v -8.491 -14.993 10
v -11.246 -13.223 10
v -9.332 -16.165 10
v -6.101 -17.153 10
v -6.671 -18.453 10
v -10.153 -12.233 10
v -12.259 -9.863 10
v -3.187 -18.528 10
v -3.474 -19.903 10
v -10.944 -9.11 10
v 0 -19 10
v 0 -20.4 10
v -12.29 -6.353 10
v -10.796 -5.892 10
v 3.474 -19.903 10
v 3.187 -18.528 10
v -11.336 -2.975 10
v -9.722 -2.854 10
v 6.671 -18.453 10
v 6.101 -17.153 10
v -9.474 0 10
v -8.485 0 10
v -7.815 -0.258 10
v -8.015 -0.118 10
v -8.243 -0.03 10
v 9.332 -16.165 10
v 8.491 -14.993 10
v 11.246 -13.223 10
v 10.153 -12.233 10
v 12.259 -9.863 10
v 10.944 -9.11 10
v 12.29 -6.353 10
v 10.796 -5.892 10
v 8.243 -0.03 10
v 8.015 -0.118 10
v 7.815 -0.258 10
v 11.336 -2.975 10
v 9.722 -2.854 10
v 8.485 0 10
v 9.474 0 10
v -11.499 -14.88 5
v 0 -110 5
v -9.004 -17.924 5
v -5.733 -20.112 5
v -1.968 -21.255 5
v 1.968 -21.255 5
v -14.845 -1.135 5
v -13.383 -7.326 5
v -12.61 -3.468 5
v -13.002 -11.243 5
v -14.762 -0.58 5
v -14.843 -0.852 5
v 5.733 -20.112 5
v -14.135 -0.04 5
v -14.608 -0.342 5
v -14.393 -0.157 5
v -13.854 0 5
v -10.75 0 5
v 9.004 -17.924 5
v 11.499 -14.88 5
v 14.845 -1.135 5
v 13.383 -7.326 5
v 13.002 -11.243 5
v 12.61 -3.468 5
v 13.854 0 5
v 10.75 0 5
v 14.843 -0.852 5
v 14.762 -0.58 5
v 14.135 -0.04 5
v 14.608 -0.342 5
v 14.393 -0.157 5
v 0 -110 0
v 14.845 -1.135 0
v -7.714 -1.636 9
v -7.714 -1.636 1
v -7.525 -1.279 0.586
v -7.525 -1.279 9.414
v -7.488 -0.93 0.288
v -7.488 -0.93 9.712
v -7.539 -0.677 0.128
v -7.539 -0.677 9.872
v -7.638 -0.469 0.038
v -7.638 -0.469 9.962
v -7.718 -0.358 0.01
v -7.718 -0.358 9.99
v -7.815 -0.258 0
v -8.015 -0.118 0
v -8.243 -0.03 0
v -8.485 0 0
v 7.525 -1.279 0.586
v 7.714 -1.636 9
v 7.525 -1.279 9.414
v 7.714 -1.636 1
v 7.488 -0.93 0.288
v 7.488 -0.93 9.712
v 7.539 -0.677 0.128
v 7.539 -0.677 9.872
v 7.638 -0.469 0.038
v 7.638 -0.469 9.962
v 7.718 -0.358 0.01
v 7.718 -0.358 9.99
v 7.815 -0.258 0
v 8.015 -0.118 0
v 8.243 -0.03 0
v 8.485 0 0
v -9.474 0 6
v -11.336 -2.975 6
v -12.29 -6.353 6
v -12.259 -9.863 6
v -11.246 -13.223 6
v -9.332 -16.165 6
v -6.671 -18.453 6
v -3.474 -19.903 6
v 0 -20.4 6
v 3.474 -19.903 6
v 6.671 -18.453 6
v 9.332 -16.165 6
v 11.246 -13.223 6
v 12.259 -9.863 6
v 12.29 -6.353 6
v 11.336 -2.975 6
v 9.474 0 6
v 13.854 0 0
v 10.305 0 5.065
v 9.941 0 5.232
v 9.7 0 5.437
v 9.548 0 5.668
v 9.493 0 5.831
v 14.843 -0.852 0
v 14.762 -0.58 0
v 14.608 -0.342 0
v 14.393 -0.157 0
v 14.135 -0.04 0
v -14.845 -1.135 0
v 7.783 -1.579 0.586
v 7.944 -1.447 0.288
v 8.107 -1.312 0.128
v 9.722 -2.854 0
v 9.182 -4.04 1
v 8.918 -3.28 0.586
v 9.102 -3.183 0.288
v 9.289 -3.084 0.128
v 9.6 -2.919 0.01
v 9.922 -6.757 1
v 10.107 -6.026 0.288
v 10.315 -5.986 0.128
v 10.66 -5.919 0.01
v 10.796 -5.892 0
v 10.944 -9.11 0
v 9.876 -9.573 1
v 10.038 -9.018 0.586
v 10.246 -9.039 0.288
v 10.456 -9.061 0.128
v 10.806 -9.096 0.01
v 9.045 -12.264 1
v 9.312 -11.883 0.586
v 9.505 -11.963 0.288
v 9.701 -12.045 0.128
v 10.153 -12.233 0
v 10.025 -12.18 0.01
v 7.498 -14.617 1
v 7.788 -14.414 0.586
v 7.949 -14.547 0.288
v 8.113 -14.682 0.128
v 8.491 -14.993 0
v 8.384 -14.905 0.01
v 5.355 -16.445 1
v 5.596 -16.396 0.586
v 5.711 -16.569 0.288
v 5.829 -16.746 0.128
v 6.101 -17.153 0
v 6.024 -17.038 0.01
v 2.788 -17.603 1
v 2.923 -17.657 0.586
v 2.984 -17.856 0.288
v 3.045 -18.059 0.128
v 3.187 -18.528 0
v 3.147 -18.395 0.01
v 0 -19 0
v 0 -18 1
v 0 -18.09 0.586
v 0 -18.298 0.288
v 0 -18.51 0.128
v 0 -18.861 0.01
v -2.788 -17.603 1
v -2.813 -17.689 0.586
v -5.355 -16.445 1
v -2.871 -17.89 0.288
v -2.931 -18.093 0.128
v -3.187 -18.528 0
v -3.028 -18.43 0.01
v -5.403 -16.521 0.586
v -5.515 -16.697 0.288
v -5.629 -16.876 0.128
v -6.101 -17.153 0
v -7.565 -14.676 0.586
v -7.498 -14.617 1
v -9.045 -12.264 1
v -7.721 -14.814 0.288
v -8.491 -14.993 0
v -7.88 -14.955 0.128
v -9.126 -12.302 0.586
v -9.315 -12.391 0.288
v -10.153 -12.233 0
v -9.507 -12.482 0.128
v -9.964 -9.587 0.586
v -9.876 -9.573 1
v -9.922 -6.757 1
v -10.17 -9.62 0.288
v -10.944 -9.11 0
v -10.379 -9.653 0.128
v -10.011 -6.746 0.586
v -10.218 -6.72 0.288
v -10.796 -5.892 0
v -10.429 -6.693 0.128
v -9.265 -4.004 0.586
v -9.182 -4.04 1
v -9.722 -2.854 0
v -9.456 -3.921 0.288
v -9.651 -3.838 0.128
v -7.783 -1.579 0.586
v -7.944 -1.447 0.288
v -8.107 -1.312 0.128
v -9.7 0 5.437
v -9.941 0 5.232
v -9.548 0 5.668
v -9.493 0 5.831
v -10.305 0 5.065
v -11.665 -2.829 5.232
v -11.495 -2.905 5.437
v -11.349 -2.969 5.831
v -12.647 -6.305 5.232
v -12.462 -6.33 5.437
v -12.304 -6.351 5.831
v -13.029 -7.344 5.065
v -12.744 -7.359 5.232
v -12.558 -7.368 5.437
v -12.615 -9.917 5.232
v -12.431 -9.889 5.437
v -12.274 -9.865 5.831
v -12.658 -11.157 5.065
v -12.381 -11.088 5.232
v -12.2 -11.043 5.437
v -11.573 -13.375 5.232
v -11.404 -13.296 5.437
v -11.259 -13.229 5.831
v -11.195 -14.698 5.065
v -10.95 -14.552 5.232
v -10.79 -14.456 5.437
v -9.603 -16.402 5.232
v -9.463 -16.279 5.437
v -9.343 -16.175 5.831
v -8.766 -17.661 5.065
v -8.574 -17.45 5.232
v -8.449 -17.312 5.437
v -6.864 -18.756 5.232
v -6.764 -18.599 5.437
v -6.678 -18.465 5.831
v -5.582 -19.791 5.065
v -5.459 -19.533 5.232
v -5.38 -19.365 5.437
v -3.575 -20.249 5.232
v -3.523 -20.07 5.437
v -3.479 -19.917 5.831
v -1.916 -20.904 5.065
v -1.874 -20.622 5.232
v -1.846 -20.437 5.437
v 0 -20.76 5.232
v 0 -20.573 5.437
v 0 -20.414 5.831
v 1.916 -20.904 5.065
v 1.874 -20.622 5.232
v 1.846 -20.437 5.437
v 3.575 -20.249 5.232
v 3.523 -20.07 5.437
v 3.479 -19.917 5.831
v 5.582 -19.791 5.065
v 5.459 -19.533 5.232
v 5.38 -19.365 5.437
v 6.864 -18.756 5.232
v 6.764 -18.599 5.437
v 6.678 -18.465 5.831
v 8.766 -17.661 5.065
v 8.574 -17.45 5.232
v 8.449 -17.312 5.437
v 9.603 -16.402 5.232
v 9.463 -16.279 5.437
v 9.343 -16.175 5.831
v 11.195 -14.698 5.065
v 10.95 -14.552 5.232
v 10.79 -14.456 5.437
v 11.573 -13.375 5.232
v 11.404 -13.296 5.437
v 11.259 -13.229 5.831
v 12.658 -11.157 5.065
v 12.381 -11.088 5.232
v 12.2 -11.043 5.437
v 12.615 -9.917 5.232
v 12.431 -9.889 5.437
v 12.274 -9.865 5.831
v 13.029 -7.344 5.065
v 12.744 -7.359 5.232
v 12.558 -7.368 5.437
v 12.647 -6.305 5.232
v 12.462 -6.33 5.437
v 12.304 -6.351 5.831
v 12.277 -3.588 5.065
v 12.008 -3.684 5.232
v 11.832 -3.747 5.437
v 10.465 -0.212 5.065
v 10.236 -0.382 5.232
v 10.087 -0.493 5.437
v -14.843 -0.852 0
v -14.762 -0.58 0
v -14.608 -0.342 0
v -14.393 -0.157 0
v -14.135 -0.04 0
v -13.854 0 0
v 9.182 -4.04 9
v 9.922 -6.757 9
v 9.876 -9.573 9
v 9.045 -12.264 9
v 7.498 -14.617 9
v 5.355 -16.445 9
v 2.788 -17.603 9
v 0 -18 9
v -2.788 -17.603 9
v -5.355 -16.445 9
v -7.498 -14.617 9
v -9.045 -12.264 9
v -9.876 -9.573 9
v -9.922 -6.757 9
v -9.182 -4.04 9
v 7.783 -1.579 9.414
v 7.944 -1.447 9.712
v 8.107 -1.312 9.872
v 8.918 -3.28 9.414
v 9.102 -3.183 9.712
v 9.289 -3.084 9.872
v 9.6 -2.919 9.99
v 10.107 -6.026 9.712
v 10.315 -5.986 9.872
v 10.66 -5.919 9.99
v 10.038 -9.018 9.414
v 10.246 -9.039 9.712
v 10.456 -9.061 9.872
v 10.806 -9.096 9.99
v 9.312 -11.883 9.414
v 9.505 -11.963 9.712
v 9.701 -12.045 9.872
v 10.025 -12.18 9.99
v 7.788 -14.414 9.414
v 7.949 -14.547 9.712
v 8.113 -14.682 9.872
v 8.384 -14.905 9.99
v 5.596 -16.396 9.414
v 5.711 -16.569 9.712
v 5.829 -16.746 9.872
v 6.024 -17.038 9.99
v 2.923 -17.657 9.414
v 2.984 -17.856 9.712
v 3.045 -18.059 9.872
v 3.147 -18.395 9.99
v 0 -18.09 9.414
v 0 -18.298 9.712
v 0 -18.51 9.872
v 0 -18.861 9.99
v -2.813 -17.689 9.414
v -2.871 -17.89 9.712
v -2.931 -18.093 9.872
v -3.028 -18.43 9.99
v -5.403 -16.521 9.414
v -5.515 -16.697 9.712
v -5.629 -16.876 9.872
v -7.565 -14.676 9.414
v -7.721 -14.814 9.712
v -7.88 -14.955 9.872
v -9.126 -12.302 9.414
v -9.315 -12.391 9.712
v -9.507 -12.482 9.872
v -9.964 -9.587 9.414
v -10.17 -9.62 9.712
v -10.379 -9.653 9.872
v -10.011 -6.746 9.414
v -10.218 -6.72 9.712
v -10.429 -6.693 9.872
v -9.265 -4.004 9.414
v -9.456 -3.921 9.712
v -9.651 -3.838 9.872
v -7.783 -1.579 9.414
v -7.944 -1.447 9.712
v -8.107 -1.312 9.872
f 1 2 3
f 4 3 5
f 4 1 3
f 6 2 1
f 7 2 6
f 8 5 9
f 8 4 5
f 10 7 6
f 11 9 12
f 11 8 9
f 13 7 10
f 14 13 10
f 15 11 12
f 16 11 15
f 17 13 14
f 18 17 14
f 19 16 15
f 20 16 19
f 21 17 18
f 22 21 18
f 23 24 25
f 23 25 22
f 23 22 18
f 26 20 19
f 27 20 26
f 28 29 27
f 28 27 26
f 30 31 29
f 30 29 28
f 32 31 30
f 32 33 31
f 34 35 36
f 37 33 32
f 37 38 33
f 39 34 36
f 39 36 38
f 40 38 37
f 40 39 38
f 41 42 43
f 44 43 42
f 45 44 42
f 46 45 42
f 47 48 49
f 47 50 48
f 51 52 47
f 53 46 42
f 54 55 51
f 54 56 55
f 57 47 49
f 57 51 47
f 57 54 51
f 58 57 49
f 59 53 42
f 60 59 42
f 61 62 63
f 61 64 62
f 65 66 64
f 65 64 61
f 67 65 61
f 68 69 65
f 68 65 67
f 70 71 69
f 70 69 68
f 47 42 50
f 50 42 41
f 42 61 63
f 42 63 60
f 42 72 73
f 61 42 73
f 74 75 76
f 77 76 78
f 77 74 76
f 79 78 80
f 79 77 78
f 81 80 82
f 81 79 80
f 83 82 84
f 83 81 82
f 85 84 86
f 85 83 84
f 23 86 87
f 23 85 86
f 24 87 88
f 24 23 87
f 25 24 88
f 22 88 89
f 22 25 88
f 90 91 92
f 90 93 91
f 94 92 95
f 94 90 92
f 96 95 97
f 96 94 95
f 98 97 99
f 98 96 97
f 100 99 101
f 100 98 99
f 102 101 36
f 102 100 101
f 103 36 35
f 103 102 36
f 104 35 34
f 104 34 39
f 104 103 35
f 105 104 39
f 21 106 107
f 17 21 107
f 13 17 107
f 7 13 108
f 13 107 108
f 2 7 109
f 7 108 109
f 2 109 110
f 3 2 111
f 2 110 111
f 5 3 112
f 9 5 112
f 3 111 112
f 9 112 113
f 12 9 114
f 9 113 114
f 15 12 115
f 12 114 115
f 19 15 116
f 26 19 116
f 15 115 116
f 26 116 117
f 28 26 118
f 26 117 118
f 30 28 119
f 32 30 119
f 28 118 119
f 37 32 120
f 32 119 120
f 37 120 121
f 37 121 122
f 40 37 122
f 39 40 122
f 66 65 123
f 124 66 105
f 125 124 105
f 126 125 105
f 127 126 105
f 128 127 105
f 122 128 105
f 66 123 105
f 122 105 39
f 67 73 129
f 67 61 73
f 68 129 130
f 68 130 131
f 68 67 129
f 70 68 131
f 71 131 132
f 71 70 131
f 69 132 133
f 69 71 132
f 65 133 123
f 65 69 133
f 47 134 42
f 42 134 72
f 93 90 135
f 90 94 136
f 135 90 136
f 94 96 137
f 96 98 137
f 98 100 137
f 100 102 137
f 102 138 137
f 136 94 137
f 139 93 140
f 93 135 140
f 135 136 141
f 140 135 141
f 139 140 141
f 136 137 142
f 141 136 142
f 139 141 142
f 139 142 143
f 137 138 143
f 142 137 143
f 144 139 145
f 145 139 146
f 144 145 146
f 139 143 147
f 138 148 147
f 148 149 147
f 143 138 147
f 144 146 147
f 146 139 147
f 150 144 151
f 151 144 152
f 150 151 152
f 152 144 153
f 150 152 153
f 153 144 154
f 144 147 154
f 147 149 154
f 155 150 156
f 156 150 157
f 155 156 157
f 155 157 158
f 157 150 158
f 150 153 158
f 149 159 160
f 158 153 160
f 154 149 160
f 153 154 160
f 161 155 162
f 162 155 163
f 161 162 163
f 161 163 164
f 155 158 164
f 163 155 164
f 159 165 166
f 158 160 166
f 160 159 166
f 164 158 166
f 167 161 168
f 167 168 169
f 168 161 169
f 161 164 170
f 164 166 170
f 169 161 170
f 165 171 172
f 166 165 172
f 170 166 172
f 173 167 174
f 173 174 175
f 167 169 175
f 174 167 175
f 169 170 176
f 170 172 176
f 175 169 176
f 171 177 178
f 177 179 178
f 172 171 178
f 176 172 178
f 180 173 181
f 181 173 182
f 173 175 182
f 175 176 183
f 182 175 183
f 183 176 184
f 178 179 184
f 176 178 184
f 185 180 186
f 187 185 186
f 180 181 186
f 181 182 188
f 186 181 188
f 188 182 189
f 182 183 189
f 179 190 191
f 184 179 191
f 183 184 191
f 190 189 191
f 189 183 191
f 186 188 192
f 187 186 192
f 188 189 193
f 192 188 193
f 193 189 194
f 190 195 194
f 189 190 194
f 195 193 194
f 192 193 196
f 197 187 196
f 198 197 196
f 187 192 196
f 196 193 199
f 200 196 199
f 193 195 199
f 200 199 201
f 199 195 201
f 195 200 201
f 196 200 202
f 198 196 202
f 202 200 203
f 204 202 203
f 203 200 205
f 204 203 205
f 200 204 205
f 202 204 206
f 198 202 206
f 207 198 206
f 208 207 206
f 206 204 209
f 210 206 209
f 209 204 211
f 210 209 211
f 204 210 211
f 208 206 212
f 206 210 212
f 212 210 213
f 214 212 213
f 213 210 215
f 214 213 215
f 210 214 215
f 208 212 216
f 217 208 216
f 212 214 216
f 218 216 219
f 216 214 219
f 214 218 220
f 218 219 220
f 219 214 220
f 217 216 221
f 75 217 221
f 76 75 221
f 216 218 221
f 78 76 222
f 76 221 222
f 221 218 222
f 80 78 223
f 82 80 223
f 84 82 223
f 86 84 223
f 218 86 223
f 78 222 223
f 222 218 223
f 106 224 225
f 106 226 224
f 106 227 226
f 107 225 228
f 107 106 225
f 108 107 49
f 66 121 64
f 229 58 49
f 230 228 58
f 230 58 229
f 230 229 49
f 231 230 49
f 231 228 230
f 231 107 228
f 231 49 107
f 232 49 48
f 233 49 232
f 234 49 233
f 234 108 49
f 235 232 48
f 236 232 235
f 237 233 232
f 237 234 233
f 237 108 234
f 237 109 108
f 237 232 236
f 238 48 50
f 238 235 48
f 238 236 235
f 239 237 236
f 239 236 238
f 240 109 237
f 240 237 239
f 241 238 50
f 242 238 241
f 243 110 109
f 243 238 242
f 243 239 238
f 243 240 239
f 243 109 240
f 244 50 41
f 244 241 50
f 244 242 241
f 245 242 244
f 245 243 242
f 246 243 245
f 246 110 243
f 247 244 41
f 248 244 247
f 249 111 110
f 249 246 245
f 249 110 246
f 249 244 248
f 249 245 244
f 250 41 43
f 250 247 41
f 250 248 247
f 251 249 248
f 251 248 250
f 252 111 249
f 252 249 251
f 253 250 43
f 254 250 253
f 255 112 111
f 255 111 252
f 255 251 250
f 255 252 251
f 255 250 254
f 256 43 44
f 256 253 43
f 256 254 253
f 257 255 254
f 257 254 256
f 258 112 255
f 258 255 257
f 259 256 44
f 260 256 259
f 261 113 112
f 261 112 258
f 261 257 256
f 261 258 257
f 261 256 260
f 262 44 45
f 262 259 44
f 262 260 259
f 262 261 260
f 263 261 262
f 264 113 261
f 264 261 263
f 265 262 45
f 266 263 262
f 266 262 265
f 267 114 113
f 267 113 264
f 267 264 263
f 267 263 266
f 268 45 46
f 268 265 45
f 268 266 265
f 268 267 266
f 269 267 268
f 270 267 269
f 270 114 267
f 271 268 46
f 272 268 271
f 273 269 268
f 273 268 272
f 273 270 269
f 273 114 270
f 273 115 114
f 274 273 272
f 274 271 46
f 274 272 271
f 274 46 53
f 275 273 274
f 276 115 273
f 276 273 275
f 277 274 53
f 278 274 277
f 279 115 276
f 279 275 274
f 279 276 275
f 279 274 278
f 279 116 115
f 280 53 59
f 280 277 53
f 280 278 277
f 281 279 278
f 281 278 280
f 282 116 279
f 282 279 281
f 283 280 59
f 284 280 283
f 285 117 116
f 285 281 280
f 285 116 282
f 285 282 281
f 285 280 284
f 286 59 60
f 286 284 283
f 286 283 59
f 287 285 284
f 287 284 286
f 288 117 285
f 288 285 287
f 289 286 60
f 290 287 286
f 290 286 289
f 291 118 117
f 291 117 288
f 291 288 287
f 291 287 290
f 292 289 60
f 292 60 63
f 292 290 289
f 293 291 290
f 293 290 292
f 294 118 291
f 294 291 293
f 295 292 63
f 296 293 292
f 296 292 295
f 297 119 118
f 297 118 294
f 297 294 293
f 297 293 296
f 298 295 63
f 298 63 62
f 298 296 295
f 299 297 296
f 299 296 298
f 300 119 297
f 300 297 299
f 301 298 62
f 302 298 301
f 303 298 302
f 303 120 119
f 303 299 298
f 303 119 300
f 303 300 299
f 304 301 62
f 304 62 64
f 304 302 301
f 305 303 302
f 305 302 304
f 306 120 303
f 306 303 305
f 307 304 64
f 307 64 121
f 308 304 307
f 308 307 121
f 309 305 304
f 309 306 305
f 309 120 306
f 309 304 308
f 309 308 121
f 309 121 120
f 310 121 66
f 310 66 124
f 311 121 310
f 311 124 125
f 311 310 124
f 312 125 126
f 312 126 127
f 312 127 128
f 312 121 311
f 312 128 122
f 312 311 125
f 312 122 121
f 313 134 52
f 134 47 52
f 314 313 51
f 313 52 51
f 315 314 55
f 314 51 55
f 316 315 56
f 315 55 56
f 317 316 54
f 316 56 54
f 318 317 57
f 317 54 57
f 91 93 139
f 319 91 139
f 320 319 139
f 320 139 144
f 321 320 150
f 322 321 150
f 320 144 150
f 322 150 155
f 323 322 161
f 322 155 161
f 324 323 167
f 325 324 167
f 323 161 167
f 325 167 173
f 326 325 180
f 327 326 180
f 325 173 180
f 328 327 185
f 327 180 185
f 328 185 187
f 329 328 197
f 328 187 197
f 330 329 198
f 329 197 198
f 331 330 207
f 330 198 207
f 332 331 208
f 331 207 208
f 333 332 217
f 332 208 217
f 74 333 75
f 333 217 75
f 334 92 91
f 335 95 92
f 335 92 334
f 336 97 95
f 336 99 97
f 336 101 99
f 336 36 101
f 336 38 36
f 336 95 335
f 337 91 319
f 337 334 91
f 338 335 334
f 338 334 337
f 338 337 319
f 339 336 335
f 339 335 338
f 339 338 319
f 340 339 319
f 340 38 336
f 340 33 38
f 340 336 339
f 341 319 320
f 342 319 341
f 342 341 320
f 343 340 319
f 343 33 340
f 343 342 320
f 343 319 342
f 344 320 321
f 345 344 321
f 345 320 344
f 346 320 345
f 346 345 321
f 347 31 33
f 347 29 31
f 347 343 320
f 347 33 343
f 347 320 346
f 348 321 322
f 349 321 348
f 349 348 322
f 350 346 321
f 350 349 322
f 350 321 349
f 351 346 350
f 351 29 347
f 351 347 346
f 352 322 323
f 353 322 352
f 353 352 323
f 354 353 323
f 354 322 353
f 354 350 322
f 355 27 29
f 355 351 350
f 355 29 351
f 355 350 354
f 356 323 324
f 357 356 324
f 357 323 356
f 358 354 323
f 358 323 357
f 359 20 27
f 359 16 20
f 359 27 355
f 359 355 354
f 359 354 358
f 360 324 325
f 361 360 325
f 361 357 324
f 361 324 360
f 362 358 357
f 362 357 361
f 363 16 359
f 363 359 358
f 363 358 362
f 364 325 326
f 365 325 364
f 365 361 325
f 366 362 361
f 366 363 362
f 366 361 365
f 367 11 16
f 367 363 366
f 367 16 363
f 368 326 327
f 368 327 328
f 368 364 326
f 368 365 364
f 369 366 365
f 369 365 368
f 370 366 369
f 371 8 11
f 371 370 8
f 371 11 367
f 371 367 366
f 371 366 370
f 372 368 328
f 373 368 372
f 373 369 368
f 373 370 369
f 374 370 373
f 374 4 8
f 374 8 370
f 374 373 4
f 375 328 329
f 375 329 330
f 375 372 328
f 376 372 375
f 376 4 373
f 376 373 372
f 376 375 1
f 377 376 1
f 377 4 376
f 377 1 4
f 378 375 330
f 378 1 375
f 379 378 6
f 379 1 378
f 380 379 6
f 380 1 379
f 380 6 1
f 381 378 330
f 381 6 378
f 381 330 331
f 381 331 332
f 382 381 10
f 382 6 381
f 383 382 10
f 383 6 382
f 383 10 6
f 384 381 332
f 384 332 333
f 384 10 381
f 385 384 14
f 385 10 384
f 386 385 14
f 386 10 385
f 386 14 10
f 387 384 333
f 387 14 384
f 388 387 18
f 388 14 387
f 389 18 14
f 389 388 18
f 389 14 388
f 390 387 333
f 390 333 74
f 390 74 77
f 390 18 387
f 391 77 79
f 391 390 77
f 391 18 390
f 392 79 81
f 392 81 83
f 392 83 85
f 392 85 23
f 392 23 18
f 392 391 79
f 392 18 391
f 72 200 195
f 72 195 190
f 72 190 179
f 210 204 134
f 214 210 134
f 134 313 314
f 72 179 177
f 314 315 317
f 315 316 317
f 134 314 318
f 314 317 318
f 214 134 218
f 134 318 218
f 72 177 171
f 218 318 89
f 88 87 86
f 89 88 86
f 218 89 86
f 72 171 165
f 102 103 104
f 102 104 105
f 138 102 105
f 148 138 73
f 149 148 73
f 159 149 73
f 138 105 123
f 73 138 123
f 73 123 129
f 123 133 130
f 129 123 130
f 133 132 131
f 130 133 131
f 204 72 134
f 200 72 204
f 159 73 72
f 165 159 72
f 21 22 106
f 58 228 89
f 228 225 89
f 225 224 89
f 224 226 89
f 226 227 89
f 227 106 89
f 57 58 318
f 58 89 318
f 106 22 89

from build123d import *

# Parameters (mm, degrees)
F1_DEPTH = 5
F3_DEPTH = 5
F4_R     = 1


with BuildPart() as f1:
    # F0 (on Top) → F1 (new body)
    with BuildSketch(Plane.XY):
        with BuildLine():
            Line((-15, 0), (0, -110))
            Line((0, -110), (15, 0))
            Line((15, 0), (6, 0))
            ThreePointArc((6, 0), (8.94427191, -3.527864045), (10, -8))
            ThreePointArc((10, -8), (-4.472135955, -16.94427191), (-6, 0))
            Line((-6, 0), (-15, 0))
        make_face()
    extrude(amount=F1_DEPTH)

    # F2 (on face) → F3 (join)
    with BuildSketch(Plane.XY.offset(5)):
        with BuildLine():
            ThreePointArc((6, 0), (0, -18), (-6, 0))
            Line((-6, 0), (-9.4741754259, 0))
            ThreePointArc((-9.4741754259, 0), (0, -20.4), (9.4741754259, 0))
            Line((9.4741754259, 0), (6, 0))
        make_face()
    extrude(amount=F3_DEPTH)

    # F4
    f4_edges = [f1.edges().sort_by_distance(p)[0] for p in [
        (-6, 0, 5),
        (6, 0, 5),
        (0, -18, 10),
        (0, -18, 0),
        (0, -20.4, 5),
        (-15, 0, 2.5),
        (15, 0, 2.5),
    ]]
    fillet(f4_edges, radius=F4_R)


solid = f1.part
